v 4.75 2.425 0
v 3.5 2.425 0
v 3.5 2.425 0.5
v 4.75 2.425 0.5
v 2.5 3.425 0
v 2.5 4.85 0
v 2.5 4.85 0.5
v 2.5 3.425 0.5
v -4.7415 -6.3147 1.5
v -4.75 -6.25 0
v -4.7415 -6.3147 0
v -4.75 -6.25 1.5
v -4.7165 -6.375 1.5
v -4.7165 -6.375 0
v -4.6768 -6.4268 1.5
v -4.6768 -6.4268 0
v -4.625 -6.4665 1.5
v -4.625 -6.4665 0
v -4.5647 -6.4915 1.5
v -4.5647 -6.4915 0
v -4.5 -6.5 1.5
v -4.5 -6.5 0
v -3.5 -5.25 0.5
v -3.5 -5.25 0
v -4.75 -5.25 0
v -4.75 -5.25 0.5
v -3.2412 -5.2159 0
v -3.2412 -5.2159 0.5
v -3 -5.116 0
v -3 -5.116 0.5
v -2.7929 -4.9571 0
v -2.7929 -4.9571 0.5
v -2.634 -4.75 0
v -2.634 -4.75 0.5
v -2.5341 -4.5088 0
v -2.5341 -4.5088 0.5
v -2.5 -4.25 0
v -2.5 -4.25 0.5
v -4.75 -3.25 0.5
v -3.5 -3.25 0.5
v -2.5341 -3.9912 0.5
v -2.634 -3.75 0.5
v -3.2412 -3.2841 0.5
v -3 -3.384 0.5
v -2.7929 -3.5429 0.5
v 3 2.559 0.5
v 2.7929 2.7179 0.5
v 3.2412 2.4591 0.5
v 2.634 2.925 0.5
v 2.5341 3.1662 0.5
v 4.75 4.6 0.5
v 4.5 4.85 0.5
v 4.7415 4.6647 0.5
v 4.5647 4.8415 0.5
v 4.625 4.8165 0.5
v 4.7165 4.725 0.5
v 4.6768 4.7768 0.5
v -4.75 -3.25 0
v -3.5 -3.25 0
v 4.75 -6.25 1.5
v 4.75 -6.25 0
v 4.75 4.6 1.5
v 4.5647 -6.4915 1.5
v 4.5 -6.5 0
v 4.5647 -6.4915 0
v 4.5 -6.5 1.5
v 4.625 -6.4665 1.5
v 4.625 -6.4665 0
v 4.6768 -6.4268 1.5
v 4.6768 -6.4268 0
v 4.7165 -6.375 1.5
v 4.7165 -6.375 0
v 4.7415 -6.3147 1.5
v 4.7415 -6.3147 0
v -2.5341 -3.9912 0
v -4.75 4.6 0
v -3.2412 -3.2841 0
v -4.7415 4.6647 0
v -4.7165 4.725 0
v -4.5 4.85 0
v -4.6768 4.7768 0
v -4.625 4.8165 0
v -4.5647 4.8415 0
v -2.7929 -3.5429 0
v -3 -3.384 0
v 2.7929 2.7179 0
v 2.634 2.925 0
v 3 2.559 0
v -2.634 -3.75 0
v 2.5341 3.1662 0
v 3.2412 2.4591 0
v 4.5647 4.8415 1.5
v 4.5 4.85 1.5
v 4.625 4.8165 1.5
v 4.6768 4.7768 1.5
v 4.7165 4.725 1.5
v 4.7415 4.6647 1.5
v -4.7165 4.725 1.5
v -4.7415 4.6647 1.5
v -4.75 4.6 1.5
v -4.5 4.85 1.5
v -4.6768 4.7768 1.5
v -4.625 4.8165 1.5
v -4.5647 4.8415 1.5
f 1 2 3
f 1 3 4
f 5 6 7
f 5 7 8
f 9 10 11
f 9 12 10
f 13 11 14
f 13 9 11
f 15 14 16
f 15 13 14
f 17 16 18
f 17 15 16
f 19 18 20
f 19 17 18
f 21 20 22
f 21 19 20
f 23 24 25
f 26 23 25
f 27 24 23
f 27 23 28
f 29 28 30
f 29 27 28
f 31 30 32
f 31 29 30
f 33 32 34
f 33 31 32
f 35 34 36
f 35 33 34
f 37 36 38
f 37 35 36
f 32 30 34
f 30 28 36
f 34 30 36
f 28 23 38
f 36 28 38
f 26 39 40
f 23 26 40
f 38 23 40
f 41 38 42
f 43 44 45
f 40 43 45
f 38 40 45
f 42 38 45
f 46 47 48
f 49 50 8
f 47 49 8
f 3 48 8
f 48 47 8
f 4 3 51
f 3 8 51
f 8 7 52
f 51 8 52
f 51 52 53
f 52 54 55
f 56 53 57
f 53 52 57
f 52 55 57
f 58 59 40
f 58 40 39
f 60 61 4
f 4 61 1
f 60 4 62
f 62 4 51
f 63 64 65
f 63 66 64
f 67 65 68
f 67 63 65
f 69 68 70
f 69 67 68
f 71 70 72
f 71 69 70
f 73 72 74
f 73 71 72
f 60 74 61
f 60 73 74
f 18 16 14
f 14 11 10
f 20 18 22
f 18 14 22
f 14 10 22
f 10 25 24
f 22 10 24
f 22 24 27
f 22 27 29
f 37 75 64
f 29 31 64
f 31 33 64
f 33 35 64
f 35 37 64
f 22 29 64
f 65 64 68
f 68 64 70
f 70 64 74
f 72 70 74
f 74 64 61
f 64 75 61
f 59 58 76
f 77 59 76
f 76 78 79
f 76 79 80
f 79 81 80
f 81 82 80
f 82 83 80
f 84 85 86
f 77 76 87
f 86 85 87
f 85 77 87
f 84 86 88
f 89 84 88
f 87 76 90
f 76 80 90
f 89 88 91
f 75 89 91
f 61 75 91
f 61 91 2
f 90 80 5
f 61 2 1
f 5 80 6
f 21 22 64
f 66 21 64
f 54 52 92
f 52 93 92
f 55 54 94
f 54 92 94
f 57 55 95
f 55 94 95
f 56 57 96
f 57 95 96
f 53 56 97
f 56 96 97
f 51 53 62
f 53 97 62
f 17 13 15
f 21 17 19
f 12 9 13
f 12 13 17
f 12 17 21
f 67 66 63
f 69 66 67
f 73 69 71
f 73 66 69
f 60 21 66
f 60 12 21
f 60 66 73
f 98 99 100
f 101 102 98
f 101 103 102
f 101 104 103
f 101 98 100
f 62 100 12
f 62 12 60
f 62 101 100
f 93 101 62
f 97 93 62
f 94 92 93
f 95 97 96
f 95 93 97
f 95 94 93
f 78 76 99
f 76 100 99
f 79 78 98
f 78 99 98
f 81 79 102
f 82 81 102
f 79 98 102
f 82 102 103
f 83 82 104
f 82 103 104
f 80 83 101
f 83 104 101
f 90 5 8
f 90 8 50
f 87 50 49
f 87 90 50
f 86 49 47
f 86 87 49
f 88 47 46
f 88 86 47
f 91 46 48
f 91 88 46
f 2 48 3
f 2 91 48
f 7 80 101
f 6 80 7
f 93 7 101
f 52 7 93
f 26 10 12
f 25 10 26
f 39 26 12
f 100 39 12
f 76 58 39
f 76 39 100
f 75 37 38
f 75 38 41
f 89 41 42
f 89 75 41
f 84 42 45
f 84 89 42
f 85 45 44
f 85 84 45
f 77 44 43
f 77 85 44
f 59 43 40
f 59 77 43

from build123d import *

# Parameters (mm, degrees)
SKETCH_W        = 9.5
SKETCH_H        = 11.35
PAD_DEPTH       = 1.5
POCKET003_DEPTH = 0.5
FILLET006_R     = 0.25


with BuildPart() as part:
    # Sketch → Pad (new body)
    with BuildSketch(Plane.XY):
        with Locations((0, -0.825)):
            Rectangle(SKETCH_W, SKETCH_H)
    extrude(amount=PAD_DEPTH)

    # Sketch009 → Pocket003 (cut)
    with BuildSketch(Plane.XY):
        with BuildLine():
            Line((4.75, 4.85), (2.5, 4.85))
            Line((2.5, 4.85), (2.5, 3.425))
            ThreePointArc((2.5, 3.425), (2.792893, 2.717893), (3.5, 2.425))
            Line((3.5, 2.425), (4.75, 2.425))
            Line((4.75, 2.425), (4.75, 4.85))
        make_face()
        with BuildLine():
            Line((-3.5, -3.25), (-4.75, -3.25))
            Line((-4.75, -3.25), (-4.75, -5.25))
            Line((-3.5, -5.25), (-4.75, -5.25))
            ThreePointArc((-3.5, -5.25), (-2.792893, -4.957107), (-2.5, -4.25))
            ThreePointArc((-2.5, -4.25), (-2.792893, -3.542893), (-3.5, -3.25))
        make_face()
    extrude(amount=POCKET003_DEPTH, mode=Mode.SUBTRACT)

    # Fillet006
    fillet006_edges = [part.edges().sort_by_distance(p)[0] for p in [
        (4.75, 4.85, 1),
        (4.75, -6.5, 0.75),
        (-4.75, -6.5, 0.75),
        (-4.75, 4.85, 0.75),
    ]]
    fillet(fillet006_edges, radius=FILLET006_R)


solid = part.part
